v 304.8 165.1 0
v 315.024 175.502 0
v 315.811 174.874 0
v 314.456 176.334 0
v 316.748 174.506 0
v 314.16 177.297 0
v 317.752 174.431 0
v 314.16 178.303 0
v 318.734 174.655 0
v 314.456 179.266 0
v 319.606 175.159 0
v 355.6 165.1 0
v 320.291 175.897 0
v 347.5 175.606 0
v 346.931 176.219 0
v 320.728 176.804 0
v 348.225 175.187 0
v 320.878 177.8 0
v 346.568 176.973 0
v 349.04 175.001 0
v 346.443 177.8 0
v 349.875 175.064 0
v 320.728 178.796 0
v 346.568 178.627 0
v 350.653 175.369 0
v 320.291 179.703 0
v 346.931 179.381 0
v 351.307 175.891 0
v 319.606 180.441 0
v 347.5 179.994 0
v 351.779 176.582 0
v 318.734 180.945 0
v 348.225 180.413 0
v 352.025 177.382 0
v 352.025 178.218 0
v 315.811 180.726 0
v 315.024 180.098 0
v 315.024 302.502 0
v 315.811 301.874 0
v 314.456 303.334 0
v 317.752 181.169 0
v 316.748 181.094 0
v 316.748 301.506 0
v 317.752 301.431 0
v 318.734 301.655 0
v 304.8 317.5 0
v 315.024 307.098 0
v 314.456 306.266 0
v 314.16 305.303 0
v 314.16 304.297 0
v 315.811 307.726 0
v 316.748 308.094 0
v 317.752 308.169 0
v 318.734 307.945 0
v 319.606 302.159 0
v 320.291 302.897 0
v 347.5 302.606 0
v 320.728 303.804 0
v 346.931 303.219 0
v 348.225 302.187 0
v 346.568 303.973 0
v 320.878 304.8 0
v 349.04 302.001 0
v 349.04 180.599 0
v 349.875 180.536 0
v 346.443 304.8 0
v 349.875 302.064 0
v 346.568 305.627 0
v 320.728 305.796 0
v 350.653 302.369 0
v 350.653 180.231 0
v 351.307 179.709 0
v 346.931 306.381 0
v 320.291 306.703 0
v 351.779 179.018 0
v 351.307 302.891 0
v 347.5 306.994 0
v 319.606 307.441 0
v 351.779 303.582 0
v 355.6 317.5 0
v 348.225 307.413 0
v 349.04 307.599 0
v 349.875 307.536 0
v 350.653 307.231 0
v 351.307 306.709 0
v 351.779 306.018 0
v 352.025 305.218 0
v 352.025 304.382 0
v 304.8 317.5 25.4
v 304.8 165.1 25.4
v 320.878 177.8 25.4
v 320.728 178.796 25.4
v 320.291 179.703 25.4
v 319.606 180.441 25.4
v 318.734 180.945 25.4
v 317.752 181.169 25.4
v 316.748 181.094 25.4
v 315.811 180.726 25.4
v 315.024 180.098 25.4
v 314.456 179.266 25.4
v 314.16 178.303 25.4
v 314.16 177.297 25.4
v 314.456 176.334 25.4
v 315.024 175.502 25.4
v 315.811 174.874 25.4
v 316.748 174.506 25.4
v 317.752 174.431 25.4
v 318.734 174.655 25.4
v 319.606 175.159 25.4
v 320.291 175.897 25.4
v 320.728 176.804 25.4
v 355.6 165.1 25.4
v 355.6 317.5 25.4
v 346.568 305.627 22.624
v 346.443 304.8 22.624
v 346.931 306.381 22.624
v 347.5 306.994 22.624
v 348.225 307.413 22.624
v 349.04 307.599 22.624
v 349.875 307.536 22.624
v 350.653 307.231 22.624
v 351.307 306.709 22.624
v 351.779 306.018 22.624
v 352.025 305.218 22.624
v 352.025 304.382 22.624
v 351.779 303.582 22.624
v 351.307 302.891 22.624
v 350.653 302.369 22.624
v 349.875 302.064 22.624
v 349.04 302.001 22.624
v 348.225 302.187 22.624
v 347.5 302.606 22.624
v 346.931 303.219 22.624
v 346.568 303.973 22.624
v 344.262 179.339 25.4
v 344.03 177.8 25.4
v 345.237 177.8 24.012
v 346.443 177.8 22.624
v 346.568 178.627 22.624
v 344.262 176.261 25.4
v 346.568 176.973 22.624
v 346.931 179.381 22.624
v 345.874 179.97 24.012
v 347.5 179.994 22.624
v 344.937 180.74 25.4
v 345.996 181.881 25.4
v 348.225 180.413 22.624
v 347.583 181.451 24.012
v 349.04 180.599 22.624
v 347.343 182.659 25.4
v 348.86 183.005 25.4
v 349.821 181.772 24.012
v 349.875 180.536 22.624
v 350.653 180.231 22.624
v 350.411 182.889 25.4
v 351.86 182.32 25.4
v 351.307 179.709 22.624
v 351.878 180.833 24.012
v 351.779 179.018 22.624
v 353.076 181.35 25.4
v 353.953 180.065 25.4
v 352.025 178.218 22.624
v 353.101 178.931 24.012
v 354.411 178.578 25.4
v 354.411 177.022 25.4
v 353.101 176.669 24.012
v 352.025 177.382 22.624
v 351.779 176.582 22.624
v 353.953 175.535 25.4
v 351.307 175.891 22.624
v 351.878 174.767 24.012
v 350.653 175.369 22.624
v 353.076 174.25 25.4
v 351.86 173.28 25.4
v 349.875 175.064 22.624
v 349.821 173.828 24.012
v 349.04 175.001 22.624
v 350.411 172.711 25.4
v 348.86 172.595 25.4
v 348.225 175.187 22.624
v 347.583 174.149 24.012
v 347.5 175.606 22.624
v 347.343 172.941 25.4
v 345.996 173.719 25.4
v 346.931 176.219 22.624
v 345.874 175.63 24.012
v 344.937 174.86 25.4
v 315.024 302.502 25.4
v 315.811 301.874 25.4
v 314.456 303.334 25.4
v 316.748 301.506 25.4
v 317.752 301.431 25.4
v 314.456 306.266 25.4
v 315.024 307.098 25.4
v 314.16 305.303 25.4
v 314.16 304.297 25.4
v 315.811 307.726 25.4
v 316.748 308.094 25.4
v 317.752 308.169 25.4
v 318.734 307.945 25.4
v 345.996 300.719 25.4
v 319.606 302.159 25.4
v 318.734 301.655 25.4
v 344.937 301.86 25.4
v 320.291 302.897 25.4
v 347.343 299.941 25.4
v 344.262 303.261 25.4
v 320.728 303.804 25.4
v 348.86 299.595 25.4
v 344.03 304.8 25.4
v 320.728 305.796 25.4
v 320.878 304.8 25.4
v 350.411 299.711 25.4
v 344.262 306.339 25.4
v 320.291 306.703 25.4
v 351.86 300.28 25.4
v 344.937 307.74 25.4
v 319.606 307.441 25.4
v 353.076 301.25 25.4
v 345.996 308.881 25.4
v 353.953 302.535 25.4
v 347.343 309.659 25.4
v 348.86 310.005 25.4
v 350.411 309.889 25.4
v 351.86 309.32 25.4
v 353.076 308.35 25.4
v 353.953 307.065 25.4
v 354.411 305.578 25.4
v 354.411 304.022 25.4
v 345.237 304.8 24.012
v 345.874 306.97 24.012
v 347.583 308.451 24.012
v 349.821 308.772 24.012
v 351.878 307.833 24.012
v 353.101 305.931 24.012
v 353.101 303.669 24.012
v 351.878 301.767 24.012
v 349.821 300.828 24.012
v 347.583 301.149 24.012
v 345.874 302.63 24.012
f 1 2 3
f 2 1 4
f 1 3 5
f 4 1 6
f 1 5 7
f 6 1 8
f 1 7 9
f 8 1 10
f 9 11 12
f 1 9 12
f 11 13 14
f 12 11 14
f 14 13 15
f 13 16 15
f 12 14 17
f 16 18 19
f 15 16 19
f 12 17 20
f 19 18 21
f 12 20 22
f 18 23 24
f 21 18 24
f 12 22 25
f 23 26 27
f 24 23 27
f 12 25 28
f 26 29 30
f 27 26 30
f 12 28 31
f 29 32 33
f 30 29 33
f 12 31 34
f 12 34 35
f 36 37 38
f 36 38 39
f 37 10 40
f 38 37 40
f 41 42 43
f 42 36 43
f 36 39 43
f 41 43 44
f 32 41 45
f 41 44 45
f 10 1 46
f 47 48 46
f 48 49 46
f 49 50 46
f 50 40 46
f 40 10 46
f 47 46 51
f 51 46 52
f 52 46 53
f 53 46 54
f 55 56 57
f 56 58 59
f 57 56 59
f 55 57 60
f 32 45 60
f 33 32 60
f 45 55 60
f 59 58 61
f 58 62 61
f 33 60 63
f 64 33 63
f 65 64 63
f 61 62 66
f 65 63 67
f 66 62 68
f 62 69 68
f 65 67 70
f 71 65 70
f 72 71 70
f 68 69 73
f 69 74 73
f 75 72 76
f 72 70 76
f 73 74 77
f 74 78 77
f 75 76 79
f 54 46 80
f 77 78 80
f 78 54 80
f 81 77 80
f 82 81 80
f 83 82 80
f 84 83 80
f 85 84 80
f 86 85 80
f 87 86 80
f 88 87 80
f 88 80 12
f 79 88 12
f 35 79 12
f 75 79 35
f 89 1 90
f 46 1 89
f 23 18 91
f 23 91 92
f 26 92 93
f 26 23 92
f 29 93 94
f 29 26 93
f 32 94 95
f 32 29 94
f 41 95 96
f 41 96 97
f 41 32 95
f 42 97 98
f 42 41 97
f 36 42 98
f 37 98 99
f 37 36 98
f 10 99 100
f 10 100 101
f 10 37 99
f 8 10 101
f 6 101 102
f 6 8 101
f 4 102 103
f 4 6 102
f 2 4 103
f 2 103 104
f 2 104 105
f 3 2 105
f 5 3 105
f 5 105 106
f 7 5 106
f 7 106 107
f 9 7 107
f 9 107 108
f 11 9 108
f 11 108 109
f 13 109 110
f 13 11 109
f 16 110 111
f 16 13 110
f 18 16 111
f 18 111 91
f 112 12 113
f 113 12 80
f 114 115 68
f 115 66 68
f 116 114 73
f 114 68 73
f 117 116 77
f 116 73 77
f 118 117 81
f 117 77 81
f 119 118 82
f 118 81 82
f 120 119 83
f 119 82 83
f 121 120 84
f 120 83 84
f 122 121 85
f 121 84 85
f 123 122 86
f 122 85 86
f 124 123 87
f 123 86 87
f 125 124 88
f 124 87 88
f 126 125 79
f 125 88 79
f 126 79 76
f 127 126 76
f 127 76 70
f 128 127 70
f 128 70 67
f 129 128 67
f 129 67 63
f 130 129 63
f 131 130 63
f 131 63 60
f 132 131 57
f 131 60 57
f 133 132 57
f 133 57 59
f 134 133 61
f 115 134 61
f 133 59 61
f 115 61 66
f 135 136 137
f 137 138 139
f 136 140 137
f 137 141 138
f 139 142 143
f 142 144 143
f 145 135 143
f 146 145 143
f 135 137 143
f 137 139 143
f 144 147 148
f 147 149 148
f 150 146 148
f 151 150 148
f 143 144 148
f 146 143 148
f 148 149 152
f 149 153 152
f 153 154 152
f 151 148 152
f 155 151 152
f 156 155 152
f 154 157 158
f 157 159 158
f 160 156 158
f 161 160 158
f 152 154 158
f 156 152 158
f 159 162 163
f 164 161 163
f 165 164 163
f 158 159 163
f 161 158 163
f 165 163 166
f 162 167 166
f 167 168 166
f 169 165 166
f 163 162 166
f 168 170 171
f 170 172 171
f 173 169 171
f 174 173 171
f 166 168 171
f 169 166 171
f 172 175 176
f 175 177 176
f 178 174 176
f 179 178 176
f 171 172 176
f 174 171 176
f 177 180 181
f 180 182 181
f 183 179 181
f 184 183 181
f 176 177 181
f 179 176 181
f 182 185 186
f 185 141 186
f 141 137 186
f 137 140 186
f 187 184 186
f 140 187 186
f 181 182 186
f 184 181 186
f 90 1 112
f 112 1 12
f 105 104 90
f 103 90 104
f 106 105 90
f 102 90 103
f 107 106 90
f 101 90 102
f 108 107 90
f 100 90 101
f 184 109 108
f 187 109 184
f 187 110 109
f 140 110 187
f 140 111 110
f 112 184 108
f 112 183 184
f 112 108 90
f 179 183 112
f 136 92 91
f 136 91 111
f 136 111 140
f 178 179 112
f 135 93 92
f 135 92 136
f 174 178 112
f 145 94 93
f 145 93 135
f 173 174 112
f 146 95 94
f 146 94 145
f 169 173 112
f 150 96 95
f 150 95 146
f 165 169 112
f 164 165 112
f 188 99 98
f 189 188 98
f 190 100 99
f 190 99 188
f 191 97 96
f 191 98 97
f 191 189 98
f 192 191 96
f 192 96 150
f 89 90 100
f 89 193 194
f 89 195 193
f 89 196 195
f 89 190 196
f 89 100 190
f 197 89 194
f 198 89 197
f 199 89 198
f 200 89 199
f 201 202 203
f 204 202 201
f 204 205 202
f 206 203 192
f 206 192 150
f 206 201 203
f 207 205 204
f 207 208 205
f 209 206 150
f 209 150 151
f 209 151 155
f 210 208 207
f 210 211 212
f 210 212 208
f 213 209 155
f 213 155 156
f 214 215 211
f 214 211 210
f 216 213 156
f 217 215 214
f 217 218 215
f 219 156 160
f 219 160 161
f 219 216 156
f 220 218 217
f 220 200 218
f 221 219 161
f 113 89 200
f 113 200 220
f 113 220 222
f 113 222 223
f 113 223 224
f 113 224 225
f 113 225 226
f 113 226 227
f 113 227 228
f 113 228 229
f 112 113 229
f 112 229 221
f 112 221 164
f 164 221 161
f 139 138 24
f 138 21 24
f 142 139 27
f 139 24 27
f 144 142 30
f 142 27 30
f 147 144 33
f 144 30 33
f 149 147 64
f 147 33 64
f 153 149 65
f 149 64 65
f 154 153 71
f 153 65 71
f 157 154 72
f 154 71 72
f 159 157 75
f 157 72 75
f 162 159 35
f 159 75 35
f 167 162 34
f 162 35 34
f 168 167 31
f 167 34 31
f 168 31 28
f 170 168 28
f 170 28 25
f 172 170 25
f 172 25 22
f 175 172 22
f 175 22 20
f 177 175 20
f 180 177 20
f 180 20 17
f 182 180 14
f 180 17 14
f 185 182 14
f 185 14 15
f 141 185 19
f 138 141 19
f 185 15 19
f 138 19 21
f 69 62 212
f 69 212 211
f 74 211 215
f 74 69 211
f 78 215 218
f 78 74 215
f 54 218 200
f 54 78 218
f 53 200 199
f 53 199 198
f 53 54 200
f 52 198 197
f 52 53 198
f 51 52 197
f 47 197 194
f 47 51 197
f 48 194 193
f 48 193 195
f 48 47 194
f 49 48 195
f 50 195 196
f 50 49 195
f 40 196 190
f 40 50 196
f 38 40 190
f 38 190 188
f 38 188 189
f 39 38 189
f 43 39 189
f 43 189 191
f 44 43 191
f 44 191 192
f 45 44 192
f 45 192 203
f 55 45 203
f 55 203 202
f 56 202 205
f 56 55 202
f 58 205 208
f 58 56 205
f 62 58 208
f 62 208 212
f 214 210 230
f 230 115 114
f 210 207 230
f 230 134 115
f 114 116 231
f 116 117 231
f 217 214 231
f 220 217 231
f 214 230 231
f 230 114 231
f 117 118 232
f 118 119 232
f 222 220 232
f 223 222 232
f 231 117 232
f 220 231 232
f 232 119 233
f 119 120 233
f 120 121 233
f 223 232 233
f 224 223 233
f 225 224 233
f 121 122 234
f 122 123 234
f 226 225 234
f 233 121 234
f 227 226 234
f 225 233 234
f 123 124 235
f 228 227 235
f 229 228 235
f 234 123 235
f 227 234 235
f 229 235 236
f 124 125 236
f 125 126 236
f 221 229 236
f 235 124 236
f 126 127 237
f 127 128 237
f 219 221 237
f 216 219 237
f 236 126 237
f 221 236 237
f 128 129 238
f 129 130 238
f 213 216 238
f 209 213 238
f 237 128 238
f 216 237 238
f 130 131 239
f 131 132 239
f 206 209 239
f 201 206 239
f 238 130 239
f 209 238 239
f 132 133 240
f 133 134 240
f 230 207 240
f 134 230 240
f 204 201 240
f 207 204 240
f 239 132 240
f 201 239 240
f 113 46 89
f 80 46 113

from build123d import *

# Parameters (mm, degrees)
SKETCH1_W                                          = 50.8
SKETCH1_H                                          = 152.4
SKETCH1_R                                          = 3.3782
BOSS_EXTRUDE1_DEPTH                                = 25.4
CSK_FOR_10_FLAT_HEAD_SOCKET_CAP_SCREW1_D           = 5.6134
CSK_FOR_10_FLAT_HEAD_SOCKET_CAP_SCREW1_CSINK_D     = 10.4394
CSK_FOR_10_FLAT_HEAD_SOCKET_CAP_SCREW1_CSINK_ANGLE = 82


with BuildPart() as part:
    # Sketch1 → Boss-Extrude1 (new body)
    with BuildSketch(Plane.XY):
        with Locations((330.2, 241.3)):
            Rectangle(SKETCH1_W, SKETCH1_H)
        with Locations((317.5, 304.8)):
            Circle(SKETCH1_R, mode=Mode.SUBTRACT)
        with Locations((317.5, 177.8)):
            Circle(SKETCH1_R, mode=Mode.SUBTRACT)
    extrude(amount=BOSS_EXTRUDE1_DEPTH)

    # CSK for #10 Flat Head Socket Cap Screw1 (through all)
    with Locations(Plane.XY.offset(25.4)):
        with Locations((349.25, 304.8), (349.25, 177.8)):
            CounterSinkHole(CSK_FOR_10_FLAT_HEAD_SOCKET_CAP_SCREW1_D / 2, CSK_FOR_10_FLAT_HEAD_SOCKET_CAP_SCREW1_CSINK_D / 2, counter_sink_angle=CSK_FOR_10_FLAT_HEAD_SOCKET_CAP_SCREW1_CSINK_ANGLE)


solid = part.part
